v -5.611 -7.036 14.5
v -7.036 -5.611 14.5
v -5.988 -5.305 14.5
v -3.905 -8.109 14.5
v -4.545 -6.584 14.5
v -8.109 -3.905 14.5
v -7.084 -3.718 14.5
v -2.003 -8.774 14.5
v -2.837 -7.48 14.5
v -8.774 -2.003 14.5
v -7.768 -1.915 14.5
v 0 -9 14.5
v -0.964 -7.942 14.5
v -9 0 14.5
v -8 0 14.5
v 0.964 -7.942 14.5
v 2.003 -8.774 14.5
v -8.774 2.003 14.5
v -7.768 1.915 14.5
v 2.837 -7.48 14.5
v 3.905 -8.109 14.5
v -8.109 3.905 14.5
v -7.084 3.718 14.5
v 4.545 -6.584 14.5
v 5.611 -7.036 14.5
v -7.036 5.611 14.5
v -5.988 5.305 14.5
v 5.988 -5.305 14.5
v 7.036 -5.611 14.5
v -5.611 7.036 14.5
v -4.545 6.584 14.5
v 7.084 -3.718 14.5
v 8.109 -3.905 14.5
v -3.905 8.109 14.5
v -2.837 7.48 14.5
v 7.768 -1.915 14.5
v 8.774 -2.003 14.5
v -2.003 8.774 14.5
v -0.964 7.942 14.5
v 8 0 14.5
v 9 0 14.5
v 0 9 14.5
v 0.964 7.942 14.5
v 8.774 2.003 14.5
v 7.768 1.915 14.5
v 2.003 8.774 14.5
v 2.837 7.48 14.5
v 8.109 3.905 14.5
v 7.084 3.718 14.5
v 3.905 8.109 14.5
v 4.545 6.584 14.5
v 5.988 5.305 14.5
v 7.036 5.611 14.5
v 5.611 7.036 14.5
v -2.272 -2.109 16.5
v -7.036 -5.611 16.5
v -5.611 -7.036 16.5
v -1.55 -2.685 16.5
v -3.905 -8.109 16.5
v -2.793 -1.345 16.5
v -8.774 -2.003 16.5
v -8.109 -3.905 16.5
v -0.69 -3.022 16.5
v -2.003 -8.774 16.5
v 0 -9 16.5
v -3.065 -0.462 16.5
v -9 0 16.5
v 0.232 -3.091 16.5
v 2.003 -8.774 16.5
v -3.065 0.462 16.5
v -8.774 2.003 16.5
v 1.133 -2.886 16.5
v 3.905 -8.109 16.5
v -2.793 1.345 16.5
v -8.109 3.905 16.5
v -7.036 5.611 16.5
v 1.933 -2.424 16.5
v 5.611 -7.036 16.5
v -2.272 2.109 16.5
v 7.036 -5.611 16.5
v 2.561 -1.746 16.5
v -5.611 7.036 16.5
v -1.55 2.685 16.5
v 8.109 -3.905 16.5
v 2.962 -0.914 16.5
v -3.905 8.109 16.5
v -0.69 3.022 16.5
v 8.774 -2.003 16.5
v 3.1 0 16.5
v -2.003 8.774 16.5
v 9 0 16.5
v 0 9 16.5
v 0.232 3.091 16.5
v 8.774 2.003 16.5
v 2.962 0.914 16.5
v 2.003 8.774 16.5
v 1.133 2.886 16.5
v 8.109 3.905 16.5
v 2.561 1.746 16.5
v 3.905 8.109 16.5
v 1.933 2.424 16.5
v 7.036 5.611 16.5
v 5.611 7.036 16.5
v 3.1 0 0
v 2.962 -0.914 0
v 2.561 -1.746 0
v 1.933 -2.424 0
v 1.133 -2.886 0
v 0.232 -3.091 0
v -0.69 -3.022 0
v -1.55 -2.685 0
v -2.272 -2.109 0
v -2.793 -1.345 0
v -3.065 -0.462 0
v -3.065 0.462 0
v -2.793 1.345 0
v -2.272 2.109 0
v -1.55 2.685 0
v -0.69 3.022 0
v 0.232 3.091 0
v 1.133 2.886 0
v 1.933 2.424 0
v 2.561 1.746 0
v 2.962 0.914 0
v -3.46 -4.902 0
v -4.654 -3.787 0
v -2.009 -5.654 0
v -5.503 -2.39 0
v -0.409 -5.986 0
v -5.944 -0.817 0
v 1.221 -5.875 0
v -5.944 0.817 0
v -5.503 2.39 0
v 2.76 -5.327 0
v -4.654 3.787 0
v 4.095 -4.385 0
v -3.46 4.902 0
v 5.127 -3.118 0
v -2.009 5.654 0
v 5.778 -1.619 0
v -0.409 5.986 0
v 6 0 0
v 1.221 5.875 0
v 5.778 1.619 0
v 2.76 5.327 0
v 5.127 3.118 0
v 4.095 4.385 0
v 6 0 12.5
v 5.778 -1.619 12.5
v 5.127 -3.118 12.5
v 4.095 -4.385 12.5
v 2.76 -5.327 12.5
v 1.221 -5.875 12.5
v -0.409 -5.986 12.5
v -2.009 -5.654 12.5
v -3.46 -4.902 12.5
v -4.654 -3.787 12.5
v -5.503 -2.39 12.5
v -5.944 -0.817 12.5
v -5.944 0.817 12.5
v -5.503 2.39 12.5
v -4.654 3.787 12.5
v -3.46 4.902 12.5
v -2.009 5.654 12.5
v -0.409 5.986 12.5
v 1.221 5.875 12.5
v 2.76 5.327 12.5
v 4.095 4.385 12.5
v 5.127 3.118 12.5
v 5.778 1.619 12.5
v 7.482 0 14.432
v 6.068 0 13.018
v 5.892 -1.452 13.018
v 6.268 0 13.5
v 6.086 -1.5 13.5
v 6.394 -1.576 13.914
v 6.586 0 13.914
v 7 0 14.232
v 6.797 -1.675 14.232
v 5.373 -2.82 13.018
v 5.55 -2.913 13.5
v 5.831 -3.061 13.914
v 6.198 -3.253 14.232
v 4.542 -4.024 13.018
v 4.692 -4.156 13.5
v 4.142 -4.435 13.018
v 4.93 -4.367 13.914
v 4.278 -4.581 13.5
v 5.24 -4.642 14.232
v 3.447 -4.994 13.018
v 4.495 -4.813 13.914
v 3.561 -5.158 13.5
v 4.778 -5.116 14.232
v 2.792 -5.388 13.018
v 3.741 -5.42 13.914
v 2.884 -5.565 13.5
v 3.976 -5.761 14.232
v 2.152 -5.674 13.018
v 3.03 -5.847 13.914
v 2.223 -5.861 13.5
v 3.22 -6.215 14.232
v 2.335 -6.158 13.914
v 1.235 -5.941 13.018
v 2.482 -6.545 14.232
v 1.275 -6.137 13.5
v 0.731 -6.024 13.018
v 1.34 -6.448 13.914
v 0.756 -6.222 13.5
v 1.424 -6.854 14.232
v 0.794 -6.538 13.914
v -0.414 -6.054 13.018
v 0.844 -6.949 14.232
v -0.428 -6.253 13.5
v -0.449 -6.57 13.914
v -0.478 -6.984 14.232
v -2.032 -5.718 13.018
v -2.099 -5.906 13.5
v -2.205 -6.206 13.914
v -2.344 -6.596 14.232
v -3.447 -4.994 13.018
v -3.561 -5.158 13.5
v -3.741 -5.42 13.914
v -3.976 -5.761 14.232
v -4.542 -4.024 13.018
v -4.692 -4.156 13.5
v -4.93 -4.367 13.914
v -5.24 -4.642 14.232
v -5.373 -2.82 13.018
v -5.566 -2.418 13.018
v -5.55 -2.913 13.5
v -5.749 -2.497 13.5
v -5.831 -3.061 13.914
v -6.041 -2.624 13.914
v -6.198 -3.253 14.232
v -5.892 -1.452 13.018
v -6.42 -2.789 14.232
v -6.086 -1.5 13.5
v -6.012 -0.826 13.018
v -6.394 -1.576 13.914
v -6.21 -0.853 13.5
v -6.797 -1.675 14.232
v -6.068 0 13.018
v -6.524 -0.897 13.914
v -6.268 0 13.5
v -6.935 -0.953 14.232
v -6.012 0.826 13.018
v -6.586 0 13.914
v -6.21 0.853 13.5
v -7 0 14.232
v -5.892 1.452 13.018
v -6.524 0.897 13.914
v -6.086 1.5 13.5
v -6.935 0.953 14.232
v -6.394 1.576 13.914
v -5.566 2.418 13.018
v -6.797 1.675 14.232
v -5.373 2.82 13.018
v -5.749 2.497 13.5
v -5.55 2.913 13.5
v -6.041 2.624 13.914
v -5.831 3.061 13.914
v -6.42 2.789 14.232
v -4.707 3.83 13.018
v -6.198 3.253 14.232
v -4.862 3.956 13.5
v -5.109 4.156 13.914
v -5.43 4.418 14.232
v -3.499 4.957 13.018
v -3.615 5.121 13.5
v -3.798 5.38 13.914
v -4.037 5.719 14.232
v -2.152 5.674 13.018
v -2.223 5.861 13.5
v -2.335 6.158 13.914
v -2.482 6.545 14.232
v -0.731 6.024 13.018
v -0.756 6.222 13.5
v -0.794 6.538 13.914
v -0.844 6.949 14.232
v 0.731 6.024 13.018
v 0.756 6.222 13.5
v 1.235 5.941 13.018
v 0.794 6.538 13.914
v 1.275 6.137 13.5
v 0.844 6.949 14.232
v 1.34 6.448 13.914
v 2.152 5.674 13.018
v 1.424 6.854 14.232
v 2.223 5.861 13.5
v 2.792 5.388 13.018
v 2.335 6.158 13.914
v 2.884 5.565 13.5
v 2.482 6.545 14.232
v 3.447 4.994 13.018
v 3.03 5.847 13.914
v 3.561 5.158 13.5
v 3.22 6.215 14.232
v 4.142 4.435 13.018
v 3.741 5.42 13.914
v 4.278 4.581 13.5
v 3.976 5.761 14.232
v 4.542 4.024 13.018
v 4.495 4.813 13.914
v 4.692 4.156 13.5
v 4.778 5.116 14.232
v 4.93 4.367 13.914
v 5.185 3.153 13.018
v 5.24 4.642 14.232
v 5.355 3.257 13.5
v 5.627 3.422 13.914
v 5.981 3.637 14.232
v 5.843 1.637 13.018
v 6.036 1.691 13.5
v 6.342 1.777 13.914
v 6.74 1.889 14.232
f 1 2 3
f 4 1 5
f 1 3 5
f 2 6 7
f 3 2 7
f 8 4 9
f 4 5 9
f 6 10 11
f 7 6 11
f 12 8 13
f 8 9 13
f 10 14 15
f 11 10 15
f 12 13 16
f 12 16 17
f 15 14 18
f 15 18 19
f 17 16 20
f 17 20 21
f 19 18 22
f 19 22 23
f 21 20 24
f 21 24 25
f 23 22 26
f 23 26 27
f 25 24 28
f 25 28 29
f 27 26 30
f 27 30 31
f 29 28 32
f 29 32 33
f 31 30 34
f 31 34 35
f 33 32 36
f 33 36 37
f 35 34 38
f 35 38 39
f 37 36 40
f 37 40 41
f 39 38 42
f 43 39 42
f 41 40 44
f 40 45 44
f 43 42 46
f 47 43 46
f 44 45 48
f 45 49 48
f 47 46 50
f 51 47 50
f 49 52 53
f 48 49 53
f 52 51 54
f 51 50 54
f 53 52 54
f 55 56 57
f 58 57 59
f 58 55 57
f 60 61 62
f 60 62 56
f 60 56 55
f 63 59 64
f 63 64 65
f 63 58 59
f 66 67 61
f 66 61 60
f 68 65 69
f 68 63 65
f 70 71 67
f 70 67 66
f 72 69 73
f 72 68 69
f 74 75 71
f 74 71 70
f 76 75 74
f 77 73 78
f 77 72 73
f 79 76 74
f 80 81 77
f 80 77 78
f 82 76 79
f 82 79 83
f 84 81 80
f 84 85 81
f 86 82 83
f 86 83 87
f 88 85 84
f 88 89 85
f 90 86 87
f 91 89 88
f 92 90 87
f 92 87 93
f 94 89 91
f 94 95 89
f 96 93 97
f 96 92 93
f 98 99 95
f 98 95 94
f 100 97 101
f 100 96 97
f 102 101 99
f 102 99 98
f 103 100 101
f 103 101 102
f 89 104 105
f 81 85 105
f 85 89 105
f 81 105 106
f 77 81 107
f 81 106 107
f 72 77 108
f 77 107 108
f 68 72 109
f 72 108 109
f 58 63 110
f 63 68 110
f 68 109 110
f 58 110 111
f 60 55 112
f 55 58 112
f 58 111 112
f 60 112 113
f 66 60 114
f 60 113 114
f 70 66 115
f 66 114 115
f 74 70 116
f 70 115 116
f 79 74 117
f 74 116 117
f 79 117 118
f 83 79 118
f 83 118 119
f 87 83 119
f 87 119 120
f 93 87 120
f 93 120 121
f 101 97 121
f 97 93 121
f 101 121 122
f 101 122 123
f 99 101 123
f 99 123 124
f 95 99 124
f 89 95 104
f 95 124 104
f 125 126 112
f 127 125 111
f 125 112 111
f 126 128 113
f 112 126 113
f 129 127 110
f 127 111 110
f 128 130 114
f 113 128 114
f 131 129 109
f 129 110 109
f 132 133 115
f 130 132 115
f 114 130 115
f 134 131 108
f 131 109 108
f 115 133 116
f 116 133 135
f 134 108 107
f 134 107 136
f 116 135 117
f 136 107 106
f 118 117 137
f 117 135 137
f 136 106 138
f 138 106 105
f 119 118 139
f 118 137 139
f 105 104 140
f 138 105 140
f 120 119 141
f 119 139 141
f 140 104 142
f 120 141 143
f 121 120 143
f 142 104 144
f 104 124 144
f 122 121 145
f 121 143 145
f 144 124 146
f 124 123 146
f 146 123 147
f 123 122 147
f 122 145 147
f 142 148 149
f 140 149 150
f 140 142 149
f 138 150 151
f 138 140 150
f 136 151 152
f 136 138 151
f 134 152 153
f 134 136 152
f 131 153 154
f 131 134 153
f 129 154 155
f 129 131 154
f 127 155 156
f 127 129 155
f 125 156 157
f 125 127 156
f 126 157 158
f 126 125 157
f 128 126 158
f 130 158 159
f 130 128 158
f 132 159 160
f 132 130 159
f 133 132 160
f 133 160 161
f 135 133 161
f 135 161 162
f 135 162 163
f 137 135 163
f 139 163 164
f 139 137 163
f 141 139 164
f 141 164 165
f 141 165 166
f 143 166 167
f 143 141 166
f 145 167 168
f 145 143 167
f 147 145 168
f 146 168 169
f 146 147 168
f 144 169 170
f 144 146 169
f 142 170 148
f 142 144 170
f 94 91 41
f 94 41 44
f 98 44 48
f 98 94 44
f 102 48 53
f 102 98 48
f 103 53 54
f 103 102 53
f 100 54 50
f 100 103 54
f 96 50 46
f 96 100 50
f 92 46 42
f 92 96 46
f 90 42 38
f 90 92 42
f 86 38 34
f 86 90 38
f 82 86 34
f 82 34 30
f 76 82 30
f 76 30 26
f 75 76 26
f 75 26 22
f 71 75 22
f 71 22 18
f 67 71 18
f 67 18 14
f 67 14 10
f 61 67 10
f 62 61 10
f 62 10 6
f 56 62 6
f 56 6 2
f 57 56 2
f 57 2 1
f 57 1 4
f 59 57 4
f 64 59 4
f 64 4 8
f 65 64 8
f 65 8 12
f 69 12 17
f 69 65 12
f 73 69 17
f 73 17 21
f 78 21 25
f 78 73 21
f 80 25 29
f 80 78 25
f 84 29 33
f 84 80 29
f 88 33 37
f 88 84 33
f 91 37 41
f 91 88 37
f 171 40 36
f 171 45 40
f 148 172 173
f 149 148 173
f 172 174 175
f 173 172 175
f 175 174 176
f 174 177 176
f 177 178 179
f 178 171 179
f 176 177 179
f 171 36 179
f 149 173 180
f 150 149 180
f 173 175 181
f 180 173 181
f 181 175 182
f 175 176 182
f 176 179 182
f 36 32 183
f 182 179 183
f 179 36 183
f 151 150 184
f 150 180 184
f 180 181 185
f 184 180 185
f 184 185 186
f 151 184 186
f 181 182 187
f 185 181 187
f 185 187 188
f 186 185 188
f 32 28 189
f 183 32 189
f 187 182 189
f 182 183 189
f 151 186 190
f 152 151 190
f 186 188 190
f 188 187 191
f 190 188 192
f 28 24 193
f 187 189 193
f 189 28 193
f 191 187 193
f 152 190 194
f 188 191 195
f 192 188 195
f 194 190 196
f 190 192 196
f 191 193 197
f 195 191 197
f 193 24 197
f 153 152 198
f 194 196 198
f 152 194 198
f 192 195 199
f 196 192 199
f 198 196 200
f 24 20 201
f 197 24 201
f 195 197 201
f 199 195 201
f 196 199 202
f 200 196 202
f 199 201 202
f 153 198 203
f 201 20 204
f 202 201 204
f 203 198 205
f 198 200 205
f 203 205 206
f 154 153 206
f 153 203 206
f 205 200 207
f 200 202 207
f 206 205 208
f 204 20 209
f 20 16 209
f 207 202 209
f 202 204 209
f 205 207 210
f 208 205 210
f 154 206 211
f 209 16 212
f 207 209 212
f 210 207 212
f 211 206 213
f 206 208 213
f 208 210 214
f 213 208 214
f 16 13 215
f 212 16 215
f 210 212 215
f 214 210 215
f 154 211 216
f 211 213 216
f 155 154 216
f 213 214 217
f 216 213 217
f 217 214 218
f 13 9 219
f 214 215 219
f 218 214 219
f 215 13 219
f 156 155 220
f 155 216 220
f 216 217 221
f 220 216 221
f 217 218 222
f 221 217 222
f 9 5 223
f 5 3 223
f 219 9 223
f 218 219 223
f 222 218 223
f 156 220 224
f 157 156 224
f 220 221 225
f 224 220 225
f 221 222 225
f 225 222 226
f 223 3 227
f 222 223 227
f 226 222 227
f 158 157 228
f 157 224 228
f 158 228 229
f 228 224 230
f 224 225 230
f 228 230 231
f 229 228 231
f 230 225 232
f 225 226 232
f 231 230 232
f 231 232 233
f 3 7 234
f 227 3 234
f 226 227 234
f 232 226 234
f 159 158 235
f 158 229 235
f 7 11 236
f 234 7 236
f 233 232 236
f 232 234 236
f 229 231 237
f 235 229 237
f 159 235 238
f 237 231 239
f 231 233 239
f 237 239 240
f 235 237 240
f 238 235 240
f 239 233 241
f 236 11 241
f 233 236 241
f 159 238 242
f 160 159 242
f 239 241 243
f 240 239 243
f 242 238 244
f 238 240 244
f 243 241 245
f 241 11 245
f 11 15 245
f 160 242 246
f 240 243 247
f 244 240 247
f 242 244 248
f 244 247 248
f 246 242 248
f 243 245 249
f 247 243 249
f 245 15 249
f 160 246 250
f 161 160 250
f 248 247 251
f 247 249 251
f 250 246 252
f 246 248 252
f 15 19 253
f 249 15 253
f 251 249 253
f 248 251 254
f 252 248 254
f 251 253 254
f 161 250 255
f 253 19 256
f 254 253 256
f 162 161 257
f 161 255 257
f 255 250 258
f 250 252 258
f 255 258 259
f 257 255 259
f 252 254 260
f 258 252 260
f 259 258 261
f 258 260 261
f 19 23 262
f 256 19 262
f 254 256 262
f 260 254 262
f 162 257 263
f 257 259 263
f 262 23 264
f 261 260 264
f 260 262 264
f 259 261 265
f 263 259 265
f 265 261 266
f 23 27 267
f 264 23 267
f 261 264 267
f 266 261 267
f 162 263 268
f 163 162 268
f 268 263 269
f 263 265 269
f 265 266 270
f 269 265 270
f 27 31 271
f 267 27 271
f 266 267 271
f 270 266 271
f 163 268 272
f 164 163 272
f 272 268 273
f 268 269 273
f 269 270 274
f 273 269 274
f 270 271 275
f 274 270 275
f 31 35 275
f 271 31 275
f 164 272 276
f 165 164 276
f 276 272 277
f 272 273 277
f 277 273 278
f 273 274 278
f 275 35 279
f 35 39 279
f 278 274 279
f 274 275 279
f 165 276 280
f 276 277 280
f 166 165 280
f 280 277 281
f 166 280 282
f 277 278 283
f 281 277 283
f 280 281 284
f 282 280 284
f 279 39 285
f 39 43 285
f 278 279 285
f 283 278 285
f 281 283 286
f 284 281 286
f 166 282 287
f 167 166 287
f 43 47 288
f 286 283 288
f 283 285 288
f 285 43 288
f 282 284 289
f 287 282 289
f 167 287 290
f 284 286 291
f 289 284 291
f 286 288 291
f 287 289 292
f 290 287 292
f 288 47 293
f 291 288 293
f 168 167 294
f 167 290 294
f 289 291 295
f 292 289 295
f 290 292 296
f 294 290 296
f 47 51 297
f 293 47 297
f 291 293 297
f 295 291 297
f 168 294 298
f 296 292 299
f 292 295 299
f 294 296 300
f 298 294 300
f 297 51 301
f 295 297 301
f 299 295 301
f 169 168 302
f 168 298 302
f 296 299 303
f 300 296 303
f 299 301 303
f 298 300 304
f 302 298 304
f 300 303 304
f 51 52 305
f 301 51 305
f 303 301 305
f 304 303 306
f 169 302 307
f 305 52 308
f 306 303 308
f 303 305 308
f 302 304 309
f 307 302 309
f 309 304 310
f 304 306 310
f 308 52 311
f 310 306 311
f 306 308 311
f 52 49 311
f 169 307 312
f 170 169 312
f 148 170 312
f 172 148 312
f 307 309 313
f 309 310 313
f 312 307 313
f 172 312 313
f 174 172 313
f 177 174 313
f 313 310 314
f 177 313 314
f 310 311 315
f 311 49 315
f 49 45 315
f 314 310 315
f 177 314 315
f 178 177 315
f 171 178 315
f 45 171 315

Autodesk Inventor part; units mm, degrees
sketch "Sketch1" plane through (0, 0, 0) normal (0, 0, 1) x (1, 0, 0)
  line L0 (0, 2.8582) -> (0, -2.8582) construction
  line L1 (-5.7775, 0) -> (5.7775, 0) construction
  circle A0 centre (0, 0) radius 6
  circle A1 centre (0, 0) radius 3.1
  dimension "d0" = 12
  dimension "d1" = 6.2
extrude "Extrusion1" add sketch "Sketch1" along normal blind 16.5
sketch "Sketch2" plane through (0, 0, 16.5) normal (0, 0, 1) x (1, 0, 0)
  circle A0 centre (0, 0) radius 4.5
  circle A1 centre (0, 0) radius 9
  dimension "d4" = 9
  dimension "d5" = 18
extrude "Extrusion2" add sketch "Sketch2" against normal blind 2
fillet "Fillet1" radius 2 1 edges at (-6, 0, 14.5)
properties part number "Hoes" material "S235"
